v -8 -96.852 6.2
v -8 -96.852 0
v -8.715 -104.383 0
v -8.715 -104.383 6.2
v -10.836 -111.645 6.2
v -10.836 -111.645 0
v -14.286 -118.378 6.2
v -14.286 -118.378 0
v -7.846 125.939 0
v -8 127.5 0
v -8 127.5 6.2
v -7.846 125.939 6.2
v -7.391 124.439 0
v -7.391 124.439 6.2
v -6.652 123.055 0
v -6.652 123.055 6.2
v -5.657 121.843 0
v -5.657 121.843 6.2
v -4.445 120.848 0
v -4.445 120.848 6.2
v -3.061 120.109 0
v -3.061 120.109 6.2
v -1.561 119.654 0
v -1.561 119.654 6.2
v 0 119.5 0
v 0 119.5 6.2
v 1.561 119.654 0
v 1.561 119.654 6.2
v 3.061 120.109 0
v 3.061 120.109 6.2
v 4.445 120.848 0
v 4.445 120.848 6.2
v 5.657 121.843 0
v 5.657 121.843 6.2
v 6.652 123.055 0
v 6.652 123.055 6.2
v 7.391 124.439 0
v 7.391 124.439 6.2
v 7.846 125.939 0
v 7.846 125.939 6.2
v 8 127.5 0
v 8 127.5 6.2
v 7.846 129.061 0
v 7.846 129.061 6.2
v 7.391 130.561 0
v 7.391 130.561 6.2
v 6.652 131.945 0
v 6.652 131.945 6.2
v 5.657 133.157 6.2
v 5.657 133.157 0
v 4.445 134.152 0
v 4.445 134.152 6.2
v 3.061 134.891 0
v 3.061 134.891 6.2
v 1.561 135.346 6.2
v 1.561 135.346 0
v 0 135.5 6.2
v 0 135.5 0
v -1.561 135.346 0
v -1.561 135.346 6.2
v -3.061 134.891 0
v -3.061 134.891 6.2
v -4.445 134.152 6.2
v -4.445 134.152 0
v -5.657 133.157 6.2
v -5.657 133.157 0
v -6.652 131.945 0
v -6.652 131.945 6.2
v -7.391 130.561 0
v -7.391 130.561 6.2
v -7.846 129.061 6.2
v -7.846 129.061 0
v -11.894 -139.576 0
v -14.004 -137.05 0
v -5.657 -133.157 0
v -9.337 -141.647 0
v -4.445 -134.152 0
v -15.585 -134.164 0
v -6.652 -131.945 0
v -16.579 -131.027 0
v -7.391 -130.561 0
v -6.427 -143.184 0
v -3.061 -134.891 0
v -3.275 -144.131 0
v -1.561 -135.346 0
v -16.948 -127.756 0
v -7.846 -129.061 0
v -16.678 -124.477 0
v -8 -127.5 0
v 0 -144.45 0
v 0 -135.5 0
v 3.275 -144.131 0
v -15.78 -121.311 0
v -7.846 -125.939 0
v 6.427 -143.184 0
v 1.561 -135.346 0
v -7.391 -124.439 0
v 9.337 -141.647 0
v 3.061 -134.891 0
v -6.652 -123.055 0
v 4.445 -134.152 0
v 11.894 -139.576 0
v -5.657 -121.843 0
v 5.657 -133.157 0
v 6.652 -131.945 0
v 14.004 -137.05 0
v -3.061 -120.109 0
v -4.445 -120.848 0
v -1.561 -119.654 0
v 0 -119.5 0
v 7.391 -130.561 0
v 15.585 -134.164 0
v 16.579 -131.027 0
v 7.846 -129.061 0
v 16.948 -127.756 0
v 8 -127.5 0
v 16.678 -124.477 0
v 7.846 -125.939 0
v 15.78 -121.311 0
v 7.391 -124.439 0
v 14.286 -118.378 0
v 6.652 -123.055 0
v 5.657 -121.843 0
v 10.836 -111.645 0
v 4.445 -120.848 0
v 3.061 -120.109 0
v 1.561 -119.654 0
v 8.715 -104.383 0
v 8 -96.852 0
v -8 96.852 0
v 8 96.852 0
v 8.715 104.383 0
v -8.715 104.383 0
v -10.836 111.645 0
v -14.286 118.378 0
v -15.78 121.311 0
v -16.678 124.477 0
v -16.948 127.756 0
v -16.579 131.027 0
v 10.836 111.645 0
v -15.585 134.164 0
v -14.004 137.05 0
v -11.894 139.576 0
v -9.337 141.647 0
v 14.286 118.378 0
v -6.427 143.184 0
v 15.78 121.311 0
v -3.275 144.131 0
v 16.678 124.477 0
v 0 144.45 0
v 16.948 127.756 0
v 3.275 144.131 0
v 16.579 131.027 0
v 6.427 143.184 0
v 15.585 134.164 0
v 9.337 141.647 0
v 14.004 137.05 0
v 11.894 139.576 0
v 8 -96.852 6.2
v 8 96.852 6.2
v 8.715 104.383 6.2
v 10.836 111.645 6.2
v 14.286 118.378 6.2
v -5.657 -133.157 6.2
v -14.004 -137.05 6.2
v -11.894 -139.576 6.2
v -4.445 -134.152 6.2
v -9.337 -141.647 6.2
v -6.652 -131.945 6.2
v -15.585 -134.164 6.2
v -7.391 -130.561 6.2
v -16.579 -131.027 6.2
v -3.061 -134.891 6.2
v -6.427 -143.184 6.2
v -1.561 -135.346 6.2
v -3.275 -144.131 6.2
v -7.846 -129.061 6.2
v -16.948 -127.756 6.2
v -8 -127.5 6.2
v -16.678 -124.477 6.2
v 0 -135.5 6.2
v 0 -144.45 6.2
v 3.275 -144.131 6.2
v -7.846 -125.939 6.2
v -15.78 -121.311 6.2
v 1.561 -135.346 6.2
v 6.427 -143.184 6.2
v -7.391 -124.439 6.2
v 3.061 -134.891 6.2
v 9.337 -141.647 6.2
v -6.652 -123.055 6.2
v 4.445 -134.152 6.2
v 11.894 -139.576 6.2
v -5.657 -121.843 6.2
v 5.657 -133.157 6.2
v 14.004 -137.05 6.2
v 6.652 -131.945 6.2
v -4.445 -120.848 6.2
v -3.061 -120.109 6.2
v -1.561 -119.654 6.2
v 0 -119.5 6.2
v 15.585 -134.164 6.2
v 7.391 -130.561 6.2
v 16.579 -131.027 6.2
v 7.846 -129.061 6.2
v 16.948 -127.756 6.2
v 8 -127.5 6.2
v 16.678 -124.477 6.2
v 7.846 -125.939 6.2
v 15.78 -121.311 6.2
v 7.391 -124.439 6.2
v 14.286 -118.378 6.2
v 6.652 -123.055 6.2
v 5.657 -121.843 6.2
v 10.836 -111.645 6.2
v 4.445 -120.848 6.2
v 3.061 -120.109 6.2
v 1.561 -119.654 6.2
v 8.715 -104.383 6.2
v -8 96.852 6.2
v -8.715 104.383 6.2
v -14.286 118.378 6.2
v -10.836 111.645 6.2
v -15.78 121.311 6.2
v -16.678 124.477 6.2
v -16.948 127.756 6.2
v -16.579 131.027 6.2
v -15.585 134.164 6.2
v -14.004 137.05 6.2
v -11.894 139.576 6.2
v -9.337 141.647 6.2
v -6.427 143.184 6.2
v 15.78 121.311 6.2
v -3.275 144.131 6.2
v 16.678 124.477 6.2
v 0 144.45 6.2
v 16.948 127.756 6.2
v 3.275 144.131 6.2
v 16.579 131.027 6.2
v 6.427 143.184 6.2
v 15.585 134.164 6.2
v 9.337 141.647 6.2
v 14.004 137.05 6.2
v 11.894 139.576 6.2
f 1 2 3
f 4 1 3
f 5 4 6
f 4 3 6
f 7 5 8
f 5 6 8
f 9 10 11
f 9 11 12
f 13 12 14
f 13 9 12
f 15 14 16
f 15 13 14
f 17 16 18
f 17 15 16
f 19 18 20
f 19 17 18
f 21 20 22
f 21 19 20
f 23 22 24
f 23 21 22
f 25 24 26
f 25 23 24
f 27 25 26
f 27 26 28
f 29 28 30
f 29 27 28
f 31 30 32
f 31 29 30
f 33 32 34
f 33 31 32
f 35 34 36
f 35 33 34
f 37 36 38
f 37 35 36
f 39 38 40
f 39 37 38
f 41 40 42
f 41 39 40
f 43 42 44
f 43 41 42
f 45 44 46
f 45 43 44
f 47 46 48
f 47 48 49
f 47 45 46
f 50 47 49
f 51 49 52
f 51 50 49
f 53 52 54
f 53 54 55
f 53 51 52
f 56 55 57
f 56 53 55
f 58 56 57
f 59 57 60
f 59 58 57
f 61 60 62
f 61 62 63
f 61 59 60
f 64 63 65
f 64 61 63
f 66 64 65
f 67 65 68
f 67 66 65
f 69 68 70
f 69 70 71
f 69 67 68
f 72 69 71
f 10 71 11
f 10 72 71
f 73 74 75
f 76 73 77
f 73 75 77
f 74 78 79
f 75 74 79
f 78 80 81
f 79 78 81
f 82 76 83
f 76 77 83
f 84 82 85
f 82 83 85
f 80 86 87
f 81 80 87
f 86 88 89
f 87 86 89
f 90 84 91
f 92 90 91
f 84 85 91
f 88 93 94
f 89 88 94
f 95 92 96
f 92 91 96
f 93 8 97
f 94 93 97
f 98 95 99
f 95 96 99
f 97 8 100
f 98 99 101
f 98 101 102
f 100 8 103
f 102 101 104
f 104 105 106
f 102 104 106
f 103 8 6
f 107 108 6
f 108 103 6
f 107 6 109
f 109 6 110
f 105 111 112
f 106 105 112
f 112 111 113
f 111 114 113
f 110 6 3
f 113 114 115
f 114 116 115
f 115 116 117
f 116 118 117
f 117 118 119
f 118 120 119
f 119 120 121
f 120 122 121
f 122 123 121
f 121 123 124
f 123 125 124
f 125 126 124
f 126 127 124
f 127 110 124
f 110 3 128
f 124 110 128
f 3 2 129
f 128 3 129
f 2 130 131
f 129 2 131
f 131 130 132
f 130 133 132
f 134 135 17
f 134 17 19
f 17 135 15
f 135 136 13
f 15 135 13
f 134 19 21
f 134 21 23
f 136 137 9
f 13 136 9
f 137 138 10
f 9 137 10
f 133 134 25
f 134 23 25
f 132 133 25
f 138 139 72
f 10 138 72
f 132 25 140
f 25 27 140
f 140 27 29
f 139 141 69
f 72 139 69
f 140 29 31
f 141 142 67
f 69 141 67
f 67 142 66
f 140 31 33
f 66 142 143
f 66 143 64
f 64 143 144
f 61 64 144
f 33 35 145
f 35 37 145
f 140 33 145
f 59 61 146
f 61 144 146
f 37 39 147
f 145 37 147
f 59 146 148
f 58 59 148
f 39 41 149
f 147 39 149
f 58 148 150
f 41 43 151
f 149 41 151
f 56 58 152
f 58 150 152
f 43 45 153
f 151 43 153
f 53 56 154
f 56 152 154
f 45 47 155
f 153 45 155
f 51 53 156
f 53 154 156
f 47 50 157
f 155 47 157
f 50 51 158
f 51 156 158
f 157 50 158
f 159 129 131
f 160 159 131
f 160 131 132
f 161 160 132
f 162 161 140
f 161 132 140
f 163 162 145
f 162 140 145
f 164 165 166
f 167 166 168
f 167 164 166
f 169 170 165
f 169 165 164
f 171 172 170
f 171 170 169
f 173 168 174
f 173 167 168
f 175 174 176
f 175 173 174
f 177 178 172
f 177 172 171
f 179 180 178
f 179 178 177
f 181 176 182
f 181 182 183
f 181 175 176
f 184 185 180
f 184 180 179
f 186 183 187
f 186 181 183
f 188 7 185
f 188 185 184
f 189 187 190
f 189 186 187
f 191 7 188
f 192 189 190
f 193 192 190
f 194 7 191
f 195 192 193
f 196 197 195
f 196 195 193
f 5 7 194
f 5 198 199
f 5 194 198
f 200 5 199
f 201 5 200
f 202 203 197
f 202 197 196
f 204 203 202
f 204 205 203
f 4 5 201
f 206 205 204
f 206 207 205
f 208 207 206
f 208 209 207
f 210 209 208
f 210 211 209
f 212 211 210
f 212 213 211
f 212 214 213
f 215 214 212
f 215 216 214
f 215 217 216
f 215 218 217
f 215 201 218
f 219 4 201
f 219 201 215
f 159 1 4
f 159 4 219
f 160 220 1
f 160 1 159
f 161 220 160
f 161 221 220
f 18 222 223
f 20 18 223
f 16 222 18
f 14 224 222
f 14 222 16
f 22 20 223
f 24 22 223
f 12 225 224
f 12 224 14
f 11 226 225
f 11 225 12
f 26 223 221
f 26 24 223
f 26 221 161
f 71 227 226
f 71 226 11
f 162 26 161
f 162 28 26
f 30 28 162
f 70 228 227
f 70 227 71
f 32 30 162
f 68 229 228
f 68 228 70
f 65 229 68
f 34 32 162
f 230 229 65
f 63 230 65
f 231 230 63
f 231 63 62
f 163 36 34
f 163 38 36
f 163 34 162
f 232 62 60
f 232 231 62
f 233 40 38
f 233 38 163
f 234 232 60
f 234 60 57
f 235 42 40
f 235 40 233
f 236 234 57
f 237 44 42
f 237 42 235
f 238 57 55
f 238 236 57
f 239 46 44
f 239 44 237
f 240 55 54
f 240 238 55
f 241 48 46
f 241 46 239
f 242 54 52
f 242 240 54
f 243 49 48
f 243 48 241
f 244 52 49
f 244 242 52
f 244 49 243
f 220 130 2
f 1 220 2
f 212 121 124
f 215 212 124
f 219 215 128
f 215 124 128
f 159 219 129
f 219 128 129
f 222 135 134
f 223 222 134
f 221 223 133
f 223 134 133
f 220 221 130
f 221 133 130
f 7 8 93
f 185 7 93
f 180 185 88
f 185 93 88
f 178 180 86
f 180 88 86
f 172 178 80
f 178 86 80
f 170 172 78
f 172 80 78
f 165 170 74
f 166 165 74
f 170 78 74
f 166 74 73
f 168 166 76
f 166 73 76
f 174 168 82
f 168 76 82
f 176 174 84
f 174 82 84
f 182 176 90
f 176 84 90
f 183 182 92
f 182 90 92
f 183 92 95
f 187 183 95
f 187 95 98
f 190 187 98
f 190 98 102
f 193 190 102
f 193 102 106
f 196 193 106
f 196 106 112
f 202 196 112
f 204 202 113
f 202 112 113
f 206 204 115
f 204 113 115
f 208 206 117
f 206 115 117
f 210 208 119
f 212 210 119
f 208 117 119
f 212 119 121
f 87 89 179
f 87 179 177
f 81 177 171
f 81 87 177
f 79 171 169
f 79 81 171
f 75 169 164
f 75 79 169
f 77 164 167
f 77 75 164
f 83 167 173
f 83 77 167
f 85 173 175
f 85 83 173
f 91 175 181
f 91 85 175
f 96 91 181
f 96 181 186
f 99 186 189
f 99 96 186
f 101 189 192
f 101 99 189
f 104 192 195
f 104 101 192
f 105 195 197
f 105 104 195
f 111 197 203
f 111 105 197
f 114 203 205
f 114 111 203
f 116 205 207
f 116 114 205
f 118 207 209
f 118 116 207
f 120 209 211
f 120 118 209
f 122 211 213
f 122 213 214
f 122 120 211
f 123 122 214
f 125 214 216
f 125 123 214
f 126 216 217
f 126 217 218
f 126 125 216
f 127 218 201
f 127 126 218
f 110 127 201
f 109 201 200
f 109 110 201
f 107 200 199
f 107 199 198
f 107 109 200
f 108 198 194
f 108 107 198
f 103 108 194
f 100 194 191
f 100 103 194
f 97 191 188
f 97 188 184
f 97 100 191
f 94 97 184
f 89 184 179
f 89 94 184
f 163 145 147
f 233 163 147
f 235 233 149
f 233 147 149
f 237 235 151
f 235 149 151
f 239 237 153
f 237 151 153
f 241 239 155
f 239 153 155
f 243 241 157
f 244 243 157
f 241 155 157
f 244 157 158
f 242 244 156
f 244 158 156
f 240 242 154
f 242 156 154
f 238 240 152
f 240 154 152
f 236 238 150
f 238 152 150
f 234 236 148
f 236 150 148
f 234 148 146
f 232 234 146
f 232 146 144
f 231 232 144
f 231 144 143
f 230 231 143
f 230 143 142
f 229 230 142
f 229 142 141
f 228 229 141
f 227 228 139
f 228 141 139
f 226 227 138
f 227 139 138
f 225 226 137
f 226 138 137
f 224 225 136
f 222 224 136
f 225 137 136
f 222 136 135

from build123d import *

# Parameters (mm, degrees)
SKETCH1_R           = 8
BOSS_EXTRUDE1_DEPTH = 6.2


with BuildPart() as part:
    # Sketch1 → Boss-Extrude1 (new body)
    with BuildSketch(Plane.XY):
        with BuildLine():
            Line((-8, 96.851957648), (-8, -96.851957648))
            ThreePointArc((-8, -96.851957648), (-9.603702256, -108.064643302), (-14.286215979, -118.378238492))
            ThreePointArc((-14.286215979, -118.378238492), (0, -144.45), (14.286215979, -118.378238492))
            ThreePointArc((14.286215979, -118.378238492), (9.603702256, -108.064643302), (8, -96.851957648))
            Line((8, -96.851957648), (8, 96.851957648))
            ThreePointArc((8, 96.851957648), (9.603702256, 108.064643302), (14.286215979, 118.378238492))
            ThreePointArc((14.286215979, 118.378238492), (0, 144.45), (-14.286215979, 118.378238492))
            ThreePointArc((-14.286215979, 118.378238492), (-9.603702256, 108.064643302), (-8, 96.851957648))
        make_face()
        with Locations(Location((0, 127.5, 0), (0, 0, 180))):
            Circle(SKETCH1_R, mode=Mode.SUBTRACT)
        with Locations(Location((0, -127.5, 0), (0, 0, 180))):
            Circle(SKETCH1_R, mode=Mode.SUBTRACT)
    extrude(amount=BOSS_EXTRUDE1_DEPTH)


solid = part.part
